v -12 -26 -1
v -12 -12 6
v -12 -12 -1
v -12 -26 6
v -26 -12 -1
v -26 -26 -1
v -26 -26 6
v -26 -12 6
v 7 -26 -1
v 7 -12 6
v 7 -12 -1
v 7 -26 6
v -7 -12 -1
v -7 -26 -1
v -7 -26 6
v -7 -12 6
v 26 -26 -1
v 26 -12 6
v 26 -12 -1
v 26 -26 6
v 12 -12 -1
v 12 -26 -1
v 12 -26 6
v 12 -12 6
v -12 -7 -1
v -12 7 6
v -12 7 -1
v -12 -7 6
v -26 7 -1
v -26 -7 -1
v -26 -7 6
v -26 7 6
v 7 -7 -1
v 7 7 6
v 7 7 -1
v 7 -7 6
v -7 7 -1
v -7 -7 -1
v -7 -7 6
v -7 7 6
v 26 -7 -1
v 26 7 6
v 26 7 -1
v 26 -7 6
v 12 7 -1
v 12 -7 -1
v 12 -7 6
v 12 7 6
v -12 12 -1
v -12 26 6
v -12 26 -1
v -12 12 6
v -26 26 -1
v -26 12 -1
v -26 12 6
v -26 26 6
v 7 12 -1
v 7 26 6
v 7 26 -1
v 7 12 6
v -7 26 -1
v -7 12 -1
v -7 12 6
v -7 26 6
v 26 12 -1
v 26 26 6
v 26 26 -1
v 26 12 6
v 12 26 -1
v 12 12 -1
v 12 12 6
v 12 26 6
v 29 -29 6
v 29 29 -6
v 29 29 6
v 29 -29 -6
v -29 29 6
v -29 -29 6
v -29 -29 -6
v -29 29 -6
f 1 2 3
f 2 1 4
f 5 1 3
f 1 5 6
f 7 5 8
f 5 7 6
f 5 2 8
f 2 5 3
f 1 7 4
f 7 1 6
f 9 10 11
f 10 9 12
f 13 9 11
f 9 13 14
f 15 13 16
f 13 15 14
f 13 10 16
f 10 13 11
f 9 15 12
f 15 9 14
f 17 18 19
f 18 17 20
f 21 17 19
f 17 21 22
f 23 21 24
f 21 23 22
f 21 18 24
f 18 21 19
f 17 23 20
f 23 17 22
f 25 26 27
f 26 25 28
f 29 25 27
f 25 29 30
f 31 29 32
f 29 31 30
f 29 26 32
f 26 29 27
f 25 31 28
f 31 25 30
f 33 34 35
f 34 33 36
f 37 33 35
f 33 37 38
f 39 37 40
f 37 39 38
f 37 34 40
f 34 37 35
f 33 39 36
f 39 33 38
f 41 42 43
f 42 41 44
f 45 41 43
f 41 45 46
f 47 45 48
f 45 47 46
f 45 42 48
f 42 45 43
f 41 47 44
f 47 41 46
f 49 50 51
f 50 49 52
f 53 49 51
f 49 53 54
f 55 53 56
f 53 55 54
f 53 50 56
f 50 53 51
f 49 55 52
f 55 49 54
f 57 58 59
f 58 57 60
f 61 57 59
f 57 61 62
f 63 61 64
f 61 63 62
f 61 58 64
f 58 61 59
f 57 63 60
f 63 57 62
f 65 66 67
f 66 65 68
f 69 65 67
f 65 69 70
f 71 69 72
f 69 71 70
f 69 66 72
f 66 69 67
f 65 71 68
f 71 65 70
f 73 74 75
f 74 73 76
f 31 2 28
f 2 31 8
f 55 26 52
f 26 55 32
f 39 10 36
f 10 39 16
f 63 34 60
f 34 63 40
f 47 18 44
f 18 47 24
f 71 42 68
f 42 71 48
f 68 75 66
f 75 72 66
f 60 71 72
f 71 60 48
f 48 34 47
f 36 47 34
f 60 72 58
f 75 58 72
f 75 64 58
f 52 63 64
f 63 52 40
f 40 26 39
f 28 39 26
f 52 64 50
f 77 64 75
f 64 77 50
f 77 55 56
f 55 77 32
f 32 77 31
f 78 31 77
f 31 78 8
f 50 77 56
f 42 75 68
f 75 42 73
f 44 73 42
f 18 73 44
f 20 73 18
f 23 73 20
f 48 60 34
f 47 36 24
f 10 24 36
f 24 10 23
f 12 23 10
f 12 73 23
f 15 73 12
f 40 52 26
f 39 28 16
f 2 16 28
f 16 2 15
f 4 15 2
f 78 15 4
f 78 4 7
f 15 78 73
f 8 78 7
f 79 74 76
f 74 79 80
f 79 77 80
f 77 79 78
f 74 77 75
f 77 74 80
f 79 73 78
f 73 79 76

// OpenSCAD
$fn = 32;

// ----------------------------------------------------------------------
// Pocket plate 58 x 58 x 12
// 3 x 3 pockets 14 mm square, 7 mm deep
// ----------------------------------------------------------------------

// --- parameters (mm) ---
thickness = 12;  // plate thickness
floor_t = 5;     // material left under each pocket
pocket = 14;     // pocket side length
pitch_x = 19;    // pocket pitch along X
pitch_y = 19;    // pocket pitch along Y
cols = 3;        // pockets per row
rows = 3;        // rows of pockets

// --- derived feature positions (mm) ---
depth = thickness - floor_t;        // = 7   pocket depth, down to the floor
span_x = (cols - 1) * pitch_x;      // = 38   distance between outer pockets
span_y = (rows - 1) * pitch_y;      // = 38   distance between outer pocket rows
origin_x = -span_x / 2;             // = -19   X of the first pocket
origin_y = -span_y / 2;             // = -19   Y of the first pocket
plate = [span_x + pocket + 6, span_y + pocket + 6, thickness];  // = [58, 58, 12]   overall size: pockets plus 3 mm of wall on each side
feature_centers = [
  [origin_x + 0 * pitch_x, origin_y + 0 * pitch_y],
  [origin_x + 1 * pitch_x, origin_y + 0 * pitch_y],
  [origin_x + 2 * pitch_x, origin_y + 0 * pitch_y],
  [origin_x + 0 * pitch_x, origin_y + 1 * pitch_y],
  [origin_x + 1 * pitch_x, origin_y + 1 * pitch_y],
  [origin_x + 2 * pitch_x, origin_y + 1 * pitch_y],
  [origin_x + 0 * pitch_x, origin_y + 2 * pitch_y],
  [origin_x + 1 * pitch_x, origin_y + 2 * pitch_y],
  [origin_x + 2 * pitch_x, origin_y + 2 * pitch_y]
];   // pocket centres, used verbatim by the cutter loop

// plate outline, then one pocket per centre in feature_centers
difference() {
  cube(plate, center = true);
  for (centre = feature_centers)
    translate([centre[0] - pocket / 2, centre[1] - pocket / 2, plate[2] / 2 - depth])
      cube([pocket, pocket, depth + 1]);  // centred on the declared pocket centre
}
